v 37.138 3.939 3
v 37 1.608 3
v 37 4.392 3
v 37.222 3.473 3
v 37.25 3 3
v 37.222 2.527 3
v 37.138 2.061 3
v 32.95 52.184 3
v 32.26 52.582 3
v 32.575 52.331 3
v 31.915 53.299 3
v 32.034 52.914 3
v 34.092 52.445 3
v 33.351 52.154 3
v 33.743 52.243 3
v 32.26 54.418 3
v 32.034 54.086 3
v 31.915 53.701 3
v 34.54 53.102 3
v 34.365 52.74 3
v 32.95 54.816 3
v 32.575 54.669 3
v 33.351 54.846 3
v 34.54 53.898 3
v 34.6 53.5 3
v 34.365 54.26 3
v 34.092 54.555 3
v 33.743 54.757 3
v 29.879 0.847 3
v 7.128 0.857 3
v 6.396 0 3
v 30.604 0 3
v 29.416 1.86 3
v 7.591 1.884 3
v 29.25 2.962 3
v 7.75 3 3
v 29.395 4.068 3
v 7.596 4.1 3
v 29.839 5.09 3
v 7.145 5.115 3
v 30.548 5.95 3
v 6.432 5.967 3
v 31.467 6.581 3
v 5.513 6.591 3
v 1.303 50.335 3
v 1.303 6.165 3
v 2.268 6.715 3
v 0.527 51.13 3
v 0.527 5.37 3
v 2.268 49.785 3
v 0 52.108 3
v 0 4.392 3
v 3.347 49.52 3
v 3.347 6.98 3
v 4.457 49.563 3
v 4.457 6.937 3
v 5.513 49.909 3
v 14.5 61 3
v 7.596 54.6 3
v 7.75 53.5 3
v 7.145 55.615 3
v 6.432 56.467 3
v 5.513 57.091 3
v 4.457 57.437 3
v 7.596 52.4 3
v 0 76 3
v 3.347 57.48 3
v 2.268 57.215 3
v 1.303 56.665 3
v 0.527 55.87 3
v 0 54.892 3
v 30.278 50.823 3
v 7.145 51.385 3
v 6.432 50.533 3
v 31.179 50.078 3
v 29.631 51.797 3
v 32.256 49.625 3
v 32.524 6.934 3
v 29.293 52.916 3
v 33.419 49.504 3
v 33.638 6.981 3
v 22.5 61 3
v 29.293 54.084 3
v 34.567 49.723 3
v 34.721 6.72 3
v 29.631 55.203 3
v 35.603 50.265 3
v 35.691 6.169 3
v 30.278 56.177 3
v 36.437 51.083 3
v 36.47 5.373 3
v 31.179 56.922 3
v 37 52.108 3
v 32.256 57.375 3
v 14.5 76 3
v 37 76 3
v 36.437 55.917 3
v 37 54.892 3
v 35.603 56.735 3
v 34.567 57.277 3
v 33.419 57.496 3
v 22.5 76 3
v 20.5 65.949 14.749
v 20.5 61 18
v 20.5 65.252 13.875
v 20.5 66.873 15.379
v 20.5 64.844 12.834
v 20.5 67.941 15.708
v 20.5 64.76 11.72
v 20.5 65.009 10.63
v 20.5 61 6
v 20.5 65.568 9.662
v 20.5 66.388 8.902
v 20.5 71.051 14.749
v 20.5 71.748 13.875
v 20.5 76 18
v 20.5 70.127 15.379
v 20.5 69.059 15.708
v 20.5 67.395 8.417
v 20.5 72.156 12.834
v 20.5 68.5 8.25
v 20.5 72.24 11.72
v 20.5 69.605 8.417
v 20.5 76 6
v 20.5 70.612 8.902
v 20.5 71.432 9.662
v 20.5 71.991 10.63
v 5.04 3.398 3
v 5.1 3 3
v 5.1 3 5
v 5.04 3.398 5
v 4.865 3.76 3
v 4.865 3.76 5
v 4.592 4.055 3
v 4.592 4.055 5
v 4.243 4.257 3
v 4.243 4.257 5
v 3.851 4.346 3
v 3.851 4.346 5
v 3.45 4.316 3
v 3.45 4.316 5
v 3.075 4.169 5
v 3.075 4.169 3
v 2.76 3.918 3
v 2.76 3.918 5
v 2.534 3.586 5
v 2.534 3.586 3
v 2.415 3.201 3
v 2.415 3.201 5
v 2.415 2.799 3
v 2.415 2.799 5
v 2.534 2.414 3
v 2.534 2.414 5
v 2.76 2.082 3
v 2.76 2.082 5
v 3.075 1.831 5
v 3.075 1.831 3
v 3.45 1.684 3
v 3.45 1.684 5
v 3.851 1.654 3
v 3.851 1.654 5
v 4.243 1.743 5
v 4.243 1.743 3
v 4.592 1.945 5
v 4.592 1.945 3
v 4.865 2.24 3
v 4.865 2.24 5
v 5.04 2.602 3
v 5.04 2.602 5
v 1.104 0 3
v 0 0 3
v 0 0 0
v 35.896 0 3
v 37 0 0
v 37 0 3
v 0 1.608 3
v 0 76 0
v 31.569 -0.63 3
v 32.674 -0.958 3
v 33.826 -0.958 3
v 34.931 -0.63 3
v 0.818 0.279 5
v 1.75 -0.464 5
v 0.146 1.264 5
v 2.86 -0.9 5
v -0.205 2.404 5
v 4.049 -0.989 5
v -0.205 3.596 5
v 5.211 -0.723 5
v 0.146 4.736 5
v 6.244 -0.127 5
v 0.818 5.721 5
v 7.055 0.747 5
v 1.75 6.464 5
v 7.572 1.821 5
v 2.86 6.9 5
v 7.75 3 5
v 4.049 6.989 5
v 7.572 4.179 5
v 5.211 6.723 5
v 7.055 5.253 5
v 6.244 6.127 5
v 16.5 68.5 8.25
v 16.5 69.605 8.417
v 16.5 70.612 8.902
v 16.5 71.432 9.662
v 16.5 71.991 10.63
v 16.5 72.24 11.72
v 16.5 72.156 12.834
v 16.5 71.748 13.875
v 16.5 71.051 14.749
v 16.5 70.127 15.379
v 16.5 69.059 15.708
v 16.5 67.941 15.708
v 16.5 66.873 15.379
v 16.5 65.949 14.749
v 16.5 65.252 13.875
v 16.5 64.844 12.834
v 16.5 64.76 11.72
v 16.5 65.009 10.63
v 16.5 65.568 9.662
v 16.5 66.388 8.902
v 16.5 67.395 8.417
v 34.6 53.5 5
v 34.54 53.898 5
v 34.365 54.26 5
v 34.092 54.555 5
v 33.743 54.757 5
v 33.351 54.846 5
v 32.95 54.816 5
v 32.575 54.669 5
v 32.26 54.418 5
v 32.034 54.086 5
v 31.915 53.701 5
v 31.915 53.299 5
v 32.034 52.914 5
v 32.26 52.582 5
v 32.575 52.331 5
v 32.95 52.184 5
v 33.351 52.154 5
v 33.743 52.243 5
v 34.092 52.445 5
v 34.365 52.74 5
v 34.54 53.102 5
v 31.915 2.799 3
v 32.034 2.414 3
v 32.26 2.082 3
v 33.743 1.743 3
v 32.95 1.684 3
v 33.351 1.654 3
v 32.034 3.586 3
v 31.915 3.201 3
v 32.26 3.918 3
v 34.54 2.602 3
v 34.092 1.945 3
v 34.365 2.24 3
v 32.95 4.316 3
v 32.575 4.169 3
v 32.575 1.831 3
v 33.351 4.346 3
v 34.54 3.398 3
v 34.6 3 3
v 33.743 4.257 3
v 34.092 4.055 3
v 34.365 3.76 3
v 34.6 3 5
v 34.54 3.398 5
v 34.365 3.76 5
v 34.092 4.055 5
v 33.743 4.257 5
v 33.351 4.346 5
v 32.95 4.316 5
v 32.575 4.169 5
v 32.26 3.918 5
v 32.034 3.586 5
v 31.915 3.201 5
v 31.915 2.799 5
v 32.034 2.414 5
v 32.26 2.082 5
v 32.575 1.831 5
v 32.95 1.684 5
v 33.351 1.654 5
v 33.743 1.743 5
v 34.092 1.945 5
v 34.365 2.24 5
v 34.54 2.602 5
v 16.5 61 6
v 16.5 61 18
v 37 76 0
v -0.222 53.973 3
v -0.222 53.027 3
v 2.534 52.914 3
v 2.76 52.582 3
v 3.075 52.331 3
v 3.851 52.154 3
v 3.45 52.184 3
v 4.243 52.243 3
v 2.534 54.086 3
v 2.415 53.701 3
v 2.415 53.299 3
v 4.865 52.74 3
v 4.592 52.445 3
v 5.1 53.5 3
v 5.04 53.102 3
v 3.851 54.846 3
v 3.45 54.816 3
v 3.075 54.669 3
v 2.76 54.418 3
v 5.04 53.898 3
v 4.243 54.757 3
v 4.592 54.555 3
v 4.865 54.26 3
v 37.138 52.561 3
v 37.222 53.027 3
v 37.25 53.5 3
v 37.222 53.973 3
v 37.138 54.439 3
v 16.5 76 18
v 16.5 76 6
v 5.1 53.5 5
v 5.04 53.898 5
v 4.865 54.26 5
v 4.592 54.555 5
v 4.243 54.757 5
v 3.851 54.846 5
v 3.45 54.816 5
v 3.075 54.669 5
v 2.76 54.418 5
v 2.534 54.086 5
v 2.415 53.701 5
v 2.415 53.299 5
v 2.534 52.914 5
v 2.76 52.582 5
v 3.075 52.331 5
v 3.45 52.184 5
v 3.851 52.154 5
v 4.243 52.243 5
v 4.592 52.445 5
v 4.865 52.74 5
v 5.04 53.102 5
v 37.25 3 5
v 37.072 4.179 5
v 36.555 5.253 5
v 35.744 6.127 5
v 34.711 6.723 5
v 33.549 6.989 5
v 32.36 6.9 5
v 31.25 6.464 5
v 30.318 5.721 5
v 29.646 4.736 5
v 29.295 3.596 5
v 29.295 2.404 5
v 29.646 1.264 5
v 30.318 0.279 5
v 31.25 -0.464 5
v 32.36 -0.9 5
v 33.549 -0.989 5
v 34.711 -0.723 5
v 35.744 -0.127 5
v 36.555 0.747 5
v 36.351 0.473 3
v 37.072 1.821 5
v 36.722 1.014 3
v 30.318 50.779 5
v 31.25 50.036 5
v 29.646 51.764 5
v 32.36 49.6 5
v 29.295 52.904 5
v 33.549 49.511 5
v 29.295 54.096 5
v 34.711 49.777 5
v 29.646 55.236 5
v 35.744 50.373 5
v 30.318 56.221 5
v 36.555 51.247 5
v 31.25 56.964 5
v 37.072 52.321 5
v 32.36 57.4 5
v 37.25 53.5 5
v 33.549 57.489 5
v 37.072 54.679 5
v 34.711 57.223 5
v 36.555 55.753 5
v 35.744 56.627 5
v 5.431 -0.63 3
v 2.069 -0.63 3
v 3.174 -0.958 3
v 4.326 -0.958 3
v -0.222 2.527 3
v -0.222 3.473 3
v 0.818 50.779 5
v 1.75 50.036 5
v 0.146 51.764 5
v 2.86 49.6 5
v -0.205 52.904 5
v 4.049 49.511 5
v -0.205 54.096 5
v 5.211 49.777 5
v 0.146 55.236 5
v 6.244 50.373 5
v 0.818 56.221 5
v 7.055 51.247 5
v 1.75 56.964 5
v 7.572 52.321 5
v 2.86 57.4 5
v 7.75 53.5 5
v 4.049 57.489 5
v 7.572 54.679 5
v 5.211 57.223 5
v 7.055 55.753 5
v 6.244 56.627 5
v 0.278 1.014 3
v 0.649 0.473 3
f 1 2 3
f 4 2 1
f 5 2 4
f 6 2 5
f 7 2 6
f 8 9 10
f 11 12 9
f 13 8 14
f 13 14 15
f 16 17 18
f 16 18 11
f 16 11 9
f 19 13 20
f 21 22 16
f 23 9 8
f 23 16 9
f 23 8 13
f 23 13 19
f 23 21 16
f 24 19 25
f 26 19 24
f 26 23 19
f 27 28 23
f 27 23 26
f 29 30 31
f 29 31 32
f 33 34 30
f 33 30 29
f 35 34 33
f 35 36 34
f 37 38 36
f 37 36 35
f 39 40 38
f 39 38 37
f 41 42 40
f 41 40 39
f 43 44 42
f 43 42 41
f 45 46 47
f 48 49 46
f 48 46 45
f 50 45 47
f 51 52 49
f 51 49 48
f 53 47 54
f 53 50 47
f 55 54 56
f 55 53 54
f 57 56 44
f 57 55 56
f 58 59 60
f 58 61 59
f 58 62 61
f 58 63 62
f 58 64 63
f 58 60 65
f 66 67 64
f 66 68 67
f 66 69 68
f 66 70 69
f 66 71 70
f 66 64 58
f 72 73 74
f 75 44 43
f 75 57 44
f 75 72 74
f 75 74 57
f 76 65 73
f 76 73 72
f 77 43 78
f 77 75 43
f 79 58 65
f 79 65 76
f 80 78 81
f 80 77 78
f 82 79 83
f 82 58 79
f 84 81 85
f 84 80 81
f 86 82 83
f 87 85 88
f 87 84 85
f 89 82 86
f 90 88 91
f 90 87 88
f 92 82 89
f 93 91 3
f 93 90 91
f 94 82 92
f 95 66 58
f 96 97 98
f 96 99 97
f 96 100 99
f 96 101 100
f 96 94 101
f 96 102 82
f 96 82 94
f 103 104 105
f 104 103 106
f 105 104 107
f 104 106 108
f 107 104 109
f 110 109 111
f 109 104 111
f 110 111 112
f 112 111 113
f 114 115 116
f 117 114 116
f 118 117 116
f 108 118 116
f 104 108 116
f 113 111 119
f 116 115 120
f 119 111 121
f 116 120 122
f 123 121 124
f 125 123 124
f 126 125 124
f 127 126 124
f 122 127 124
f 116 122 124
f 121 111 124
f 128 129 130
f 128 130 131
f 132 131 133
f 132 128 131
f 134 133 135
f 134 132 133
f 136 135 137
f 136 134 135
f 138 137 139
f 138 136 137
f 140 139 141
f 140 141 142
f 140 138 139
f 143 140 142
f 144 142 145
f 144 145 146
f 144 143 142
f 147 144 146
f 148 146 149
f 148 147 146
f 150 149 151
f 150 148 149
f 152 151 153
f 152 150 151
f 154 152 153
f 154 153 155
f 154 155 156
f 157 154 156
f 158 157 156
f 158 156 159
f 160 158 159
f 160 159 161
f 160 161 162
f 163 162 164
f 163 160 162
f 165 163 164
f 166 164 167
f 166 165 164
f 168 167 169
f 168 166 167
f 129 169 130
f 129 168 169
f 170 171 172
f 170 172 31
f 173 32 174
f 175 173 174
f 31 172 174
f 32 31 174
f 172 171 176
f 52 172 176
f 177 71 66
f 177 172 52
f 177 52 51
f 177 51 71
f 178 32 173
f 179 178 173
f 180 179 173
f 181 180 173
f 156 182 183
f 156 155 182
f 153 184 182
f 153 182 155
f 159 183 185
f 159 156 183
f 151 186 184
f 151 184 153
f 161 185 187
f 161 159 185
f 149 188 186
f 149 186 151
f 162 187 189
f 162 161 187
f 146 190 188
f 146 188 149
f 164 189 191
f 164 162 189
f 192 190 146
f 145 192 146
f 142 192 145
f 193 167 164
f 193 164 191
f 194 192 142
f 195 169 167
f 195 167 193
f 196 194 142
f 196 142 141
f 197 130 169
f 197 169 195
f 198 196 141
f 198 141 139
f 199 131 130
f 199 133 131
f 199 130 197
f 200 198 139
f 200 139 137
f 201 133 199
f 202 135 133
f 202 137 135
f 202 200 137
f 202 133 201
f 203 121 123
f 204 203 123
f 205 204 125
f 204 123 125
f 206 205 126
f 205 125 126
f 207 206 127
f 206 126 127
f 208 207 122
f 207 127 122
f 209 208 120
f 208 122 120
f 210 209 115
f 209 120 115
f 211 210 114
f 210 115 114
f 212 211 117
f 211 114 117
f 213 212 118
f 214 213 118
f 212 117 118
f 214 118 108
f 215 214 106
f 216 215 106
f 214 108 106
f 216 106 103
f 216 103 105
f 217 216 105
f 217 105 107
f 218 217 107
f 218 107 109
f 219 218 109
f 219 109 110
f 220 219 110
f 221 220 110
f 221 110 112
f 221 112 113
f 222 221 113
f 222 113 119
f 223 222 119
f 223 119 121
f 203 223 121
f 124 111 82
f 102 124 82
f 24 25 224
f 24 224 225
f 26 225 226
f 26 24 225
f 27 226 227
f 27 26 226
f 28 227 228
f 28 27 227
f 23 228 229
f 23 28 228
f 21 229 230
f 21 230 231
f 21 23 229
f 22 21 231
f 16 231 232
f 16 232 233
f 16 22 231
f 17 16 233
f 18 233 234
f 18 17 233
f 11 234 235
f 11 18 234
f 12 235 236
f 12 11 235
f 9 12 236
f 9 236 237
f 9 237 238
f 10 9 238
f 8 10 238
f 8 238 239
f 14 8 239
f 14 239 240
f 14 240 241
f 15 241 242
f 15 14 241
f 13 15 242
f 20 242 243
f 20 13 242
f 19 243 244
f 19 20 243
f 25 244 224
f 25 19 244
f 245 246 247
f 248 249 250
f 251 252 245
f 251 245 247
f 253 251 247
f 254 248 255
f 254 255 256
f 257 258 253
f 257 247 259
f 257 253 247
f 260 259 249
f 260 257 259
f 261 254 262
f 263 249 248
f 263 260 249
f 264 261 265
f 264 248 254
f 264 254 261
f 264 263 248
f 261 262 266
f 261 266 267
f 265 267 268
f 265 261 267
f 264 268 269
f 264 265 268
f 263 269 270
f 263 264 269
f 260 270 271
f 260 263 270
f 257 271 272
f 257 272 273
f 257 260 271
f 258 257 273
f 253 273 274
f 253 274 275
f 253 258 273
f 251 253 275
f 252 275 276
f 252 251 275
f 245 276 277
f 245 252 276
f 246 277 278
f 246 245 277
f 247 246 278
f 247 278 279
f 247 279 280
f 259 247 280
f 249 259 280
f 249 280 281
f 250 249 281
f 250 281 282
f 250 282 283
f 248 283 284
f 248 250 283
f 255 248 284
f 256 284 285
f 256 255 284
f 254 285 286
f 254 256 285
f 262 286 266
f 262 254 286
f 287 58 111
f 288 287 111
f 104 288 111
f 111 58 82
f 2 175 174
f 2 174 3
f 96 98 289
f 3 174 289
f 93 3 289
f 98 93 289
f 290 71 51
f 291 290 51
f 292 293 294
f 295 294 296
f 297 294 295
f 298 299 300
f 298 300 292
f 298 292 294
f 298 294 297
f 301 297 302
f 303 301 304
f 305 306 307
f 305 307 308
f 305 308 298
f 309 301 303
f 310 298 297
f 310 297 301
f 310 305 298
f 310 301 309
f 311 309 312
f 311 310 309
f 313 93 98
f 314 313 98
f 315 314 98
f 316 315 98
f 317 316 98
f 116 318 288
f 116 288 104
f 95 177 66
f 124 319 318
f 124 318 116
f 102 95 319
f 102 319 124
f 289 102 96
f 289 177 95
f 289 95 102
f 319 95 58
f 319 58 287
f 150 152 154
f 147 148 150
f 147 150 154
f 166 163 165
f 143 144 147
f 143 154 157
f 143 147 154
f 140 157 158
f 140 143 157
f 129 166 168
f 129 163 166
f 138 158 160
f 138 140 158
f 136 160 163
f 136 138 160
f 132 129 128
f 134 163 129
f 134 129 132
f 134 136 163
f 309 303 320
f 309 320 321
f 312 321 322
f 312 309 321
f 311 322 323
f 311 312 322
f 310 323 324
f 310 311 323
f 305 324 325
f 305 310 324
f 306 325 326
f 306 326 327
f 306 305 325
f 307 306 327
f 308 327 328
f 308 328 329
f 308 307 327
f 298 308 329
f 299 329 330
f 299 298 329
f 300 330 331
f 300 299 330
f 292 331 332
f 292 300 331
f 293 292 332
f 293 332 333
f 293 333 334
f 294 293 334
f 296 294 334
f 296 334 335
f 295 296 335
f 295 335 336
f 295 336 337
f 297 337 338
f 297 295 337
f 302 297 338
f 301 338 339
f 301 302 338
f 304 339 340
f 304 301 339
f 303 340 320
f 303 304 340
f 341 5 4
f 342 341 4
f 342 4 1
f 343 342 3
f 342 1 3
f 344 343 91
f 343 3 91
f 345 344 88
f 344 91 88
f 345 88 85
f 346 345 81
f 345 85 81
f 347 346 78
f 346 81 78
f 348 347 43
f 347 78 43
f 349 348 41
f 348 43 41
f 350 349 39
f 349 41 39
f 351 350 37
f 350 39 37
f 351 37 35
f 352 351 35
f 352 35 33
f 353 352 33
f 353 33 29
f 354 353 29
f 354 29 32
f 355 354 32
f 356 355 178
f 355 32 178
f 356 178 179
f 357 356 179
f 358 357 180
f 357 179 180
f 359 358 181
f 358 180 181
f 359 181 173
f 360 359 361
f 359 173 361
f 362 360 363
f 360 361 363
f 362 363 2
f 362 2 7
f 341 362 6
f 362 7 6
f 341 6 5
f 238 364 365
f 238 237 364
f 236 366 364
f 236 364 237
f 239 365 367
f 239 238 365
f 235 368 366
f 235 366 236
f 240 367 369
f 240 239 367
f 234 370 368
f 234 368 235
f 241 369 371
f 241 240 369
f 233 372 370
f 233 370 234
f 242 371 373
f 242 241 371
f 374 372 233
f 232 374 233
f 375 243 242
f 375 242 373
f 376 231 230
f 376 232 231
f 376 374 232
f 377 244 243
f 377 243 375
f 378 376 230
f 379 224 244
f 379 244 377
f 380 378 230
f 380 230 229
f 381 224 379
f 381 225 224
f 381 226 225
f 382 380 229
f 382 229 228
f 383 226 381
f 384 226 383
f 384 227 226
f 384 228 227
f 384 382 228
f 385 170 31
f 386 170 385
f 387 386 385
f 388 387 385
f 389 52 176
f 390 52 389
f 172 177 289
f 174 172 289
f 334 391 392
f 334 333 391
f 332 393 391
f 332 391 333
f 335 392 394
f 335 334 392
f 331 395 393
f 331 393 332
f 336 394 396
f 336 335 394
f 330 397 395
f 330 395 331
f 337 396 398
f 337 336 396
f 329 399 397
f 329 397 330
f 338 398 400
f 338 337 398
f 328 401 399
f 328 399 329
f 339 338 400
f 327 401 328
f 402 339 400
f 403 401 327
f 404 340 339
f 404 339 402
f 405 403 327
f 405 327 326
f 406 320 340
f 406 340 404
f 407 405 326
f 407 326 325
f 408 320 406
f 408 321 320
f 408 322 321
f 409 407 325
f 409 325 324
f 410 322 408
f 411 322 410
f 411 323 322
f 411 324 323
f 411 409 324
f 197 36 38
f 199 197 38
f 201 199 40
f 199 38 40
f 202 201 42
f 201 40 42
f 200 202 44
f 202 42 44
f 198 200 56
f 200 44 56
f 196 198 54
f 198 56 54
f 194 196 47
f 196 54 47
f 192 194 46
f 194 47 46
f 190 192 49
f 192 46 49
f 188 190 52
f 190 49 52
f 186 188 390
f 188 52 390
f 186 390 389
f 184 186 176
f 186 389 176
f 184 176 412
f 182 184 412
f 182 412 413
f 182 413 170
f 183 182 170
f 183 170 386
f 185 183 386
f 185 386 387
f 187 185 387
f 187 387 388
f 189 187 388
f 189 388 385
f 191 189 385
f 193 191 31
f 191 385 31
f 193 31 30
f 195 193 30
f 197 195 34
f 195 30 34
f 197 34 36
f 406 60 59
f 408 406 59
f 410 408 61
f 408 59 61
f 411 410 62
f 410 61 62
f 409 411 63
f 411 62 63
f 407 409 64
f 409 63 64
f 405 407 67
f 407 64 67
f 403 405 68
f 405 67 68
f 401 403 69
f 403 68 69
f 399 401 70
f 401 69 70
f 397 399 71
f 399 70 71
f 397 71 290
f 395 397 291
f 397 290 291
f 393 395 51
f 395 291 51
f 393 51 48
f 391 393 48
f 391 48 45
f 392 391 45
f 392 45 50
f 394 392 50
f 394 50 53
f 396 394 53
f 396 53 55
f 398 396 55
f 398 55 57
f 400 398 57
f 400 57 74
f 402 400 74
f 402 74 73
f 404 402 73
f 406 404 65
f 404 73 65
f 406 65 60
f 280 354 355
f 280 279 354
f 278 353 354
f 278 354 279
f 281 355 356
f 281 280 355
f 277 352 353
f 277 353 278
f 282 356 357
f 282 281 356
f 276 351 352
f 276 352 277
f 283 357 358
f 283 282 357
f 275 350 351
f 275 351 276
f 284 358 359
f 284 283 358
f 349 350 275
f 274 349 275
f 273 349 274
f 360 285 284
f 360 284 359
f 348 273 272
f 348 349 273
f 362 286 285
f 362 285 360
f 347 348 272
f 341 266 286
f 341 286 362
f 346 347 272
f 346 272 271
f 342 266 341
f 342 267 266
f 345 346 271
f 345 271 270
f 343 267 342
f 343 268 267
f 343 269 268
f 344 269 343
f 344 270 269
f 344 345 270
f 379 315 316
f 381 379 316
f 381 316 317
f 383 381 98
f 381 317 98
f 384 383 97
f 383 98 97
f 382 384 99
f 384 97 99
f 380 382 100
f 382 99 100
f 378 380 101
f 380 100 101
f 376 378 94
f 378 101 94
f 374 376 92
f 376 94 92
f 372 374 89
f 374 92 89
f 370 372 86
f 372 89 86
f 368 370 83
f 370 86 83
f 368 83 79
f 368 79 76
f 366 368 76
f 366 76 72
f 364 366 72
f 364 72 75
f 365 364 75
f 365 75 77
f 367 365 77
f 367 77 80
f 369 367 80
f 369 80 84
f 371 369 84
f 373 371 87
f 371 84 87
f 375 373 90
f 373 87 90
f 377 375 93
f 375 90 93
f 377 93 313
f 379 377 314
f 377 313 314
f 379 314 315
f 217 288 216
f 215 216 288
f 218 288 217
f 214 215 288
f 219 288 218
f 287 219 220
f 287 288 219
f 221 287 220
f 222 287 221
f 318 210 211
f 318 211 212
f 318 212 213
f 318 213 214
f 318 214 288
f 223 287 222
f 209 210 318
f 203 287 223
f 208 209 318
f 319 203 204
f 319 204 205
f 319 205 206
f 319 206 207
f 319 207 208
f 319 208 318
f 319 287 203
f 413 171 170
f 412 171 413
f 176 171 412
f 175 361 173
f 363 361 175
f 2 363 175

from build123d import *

# Parameters (mm, degrees)
MAIN_SKETCH_W                          = 37
MAIN_SKETCH_H                          = 76
MAIN_EXTRUSION_DEPTH                   = 3
BOARD_FIX_SKETCH_R                     = 4
BOARD_FIX_SKETCH_R_2                   = 1.35
BOARD_FIX_DEPTH                        = 2
JACK_FIX_SKETCH_W                      = 4
JACK_FIX_SKETCH_H                      = 15
JACK_FIX_DEPTH                         = 15
JACK_FIX_HOLE_SKETCH_R                 = 3.75
JACK_FIX_HOLE_DEPTH                    = 21.75
JACK_FIX_REINFORCEMENT_EXTRUSION_DEPTH = 15


with BuildPart() as part:
    # Main-Sketch → Main-Extrusion (new body)
    with BuildSketch(Plane.XY):
        with Locations((18.5, 38)):
            Rectangle(MAIN_SKETCH_W, MAIN_SKETCH_H)
    extrude(amount=MAIN_EXTRUSION_DEPTH)

    # Board-Fix-Sketch → Board-Fix (add)
    with BuildSketch(Plane.XY.offset(3)):
        with Locations((3.75, 3)):
            Circle(BOARD_FIX_SKETCH_R)
        with Locations((3.75, 3)):
            Circle(BOARD_FIX_SKETCH_R_2, mode=Mode.SUBTRACT)
        with Locations((33.25, 3)):
            Circle(BOARD_FIX_SKETCH_R)
        with Locations((33.25, 3)):
            Circle(BOARD_FIX_SKETCH_R_2, mode=Mode.SUBTRACT)
        with Locations((33.25, 53.5)):
            Circle(BOARD_FIX_SKETCH_R)
        with Locations((33.25, 53.5)):
            Circle(BOARD_FIX_SKETCH_R_2, mode=Mode.SUBTRACT)
        with Locations((3.75, 53.5)):
            Circle(BOARD_FIX_SKETCH_R)
        with Locations((3.75, 53.5)):
            Circle(BOARD_FIX_SKETCH_R_2, mode=Mode.SUBTRACT)
    extrude(amount=BOARD_FIX_DEPTH)

    # Jack-Fix-Sketch → Jack-Fix (add)
    with BuildSketch(Plane.XY.offset(3)):
        with Locations((18.5, 68.5)):
            Rectangle(JACK_FIX_SKETCH_W, JACK_FIX_SKETCH_H)
    extrude(amount=JACK_FIX_DEPTH)

    # Jack-Fix-Hole-Sketch → Jack-Fix-Hole (cut, through all)
    with BuildSketch(Plane(origin=(20.5, 0, 0), x_dir=(0, 0, -1), z_dir=(1, 0, 0))):
        with Locations((-12, 68.5)):
            Circle(JACK_FIX_HOLE_SKETCH_R)
    extrude(amount=-JACK_FIX_HOLE_DEPTH, mode=Mode.SUBTRACT)

    # Jack-Fix-Reinforcement-Sketch → Jack-Fix-Reinforcement-Extrusion (add)
    with BuildSketch(Plane(origin=(0, 61, 0), x_dir=(-1, 0, 0), z_dir=(0, -1, 0))):
        Polygon((-22.5, -3), (-14.5, -3), (-16.5, -6), (-20.5, -6), align=None)
    extrude(amount=-JACK_FIX_REINFORCEMENT_EXTRUSION_DEPTH)


solid = part.part
